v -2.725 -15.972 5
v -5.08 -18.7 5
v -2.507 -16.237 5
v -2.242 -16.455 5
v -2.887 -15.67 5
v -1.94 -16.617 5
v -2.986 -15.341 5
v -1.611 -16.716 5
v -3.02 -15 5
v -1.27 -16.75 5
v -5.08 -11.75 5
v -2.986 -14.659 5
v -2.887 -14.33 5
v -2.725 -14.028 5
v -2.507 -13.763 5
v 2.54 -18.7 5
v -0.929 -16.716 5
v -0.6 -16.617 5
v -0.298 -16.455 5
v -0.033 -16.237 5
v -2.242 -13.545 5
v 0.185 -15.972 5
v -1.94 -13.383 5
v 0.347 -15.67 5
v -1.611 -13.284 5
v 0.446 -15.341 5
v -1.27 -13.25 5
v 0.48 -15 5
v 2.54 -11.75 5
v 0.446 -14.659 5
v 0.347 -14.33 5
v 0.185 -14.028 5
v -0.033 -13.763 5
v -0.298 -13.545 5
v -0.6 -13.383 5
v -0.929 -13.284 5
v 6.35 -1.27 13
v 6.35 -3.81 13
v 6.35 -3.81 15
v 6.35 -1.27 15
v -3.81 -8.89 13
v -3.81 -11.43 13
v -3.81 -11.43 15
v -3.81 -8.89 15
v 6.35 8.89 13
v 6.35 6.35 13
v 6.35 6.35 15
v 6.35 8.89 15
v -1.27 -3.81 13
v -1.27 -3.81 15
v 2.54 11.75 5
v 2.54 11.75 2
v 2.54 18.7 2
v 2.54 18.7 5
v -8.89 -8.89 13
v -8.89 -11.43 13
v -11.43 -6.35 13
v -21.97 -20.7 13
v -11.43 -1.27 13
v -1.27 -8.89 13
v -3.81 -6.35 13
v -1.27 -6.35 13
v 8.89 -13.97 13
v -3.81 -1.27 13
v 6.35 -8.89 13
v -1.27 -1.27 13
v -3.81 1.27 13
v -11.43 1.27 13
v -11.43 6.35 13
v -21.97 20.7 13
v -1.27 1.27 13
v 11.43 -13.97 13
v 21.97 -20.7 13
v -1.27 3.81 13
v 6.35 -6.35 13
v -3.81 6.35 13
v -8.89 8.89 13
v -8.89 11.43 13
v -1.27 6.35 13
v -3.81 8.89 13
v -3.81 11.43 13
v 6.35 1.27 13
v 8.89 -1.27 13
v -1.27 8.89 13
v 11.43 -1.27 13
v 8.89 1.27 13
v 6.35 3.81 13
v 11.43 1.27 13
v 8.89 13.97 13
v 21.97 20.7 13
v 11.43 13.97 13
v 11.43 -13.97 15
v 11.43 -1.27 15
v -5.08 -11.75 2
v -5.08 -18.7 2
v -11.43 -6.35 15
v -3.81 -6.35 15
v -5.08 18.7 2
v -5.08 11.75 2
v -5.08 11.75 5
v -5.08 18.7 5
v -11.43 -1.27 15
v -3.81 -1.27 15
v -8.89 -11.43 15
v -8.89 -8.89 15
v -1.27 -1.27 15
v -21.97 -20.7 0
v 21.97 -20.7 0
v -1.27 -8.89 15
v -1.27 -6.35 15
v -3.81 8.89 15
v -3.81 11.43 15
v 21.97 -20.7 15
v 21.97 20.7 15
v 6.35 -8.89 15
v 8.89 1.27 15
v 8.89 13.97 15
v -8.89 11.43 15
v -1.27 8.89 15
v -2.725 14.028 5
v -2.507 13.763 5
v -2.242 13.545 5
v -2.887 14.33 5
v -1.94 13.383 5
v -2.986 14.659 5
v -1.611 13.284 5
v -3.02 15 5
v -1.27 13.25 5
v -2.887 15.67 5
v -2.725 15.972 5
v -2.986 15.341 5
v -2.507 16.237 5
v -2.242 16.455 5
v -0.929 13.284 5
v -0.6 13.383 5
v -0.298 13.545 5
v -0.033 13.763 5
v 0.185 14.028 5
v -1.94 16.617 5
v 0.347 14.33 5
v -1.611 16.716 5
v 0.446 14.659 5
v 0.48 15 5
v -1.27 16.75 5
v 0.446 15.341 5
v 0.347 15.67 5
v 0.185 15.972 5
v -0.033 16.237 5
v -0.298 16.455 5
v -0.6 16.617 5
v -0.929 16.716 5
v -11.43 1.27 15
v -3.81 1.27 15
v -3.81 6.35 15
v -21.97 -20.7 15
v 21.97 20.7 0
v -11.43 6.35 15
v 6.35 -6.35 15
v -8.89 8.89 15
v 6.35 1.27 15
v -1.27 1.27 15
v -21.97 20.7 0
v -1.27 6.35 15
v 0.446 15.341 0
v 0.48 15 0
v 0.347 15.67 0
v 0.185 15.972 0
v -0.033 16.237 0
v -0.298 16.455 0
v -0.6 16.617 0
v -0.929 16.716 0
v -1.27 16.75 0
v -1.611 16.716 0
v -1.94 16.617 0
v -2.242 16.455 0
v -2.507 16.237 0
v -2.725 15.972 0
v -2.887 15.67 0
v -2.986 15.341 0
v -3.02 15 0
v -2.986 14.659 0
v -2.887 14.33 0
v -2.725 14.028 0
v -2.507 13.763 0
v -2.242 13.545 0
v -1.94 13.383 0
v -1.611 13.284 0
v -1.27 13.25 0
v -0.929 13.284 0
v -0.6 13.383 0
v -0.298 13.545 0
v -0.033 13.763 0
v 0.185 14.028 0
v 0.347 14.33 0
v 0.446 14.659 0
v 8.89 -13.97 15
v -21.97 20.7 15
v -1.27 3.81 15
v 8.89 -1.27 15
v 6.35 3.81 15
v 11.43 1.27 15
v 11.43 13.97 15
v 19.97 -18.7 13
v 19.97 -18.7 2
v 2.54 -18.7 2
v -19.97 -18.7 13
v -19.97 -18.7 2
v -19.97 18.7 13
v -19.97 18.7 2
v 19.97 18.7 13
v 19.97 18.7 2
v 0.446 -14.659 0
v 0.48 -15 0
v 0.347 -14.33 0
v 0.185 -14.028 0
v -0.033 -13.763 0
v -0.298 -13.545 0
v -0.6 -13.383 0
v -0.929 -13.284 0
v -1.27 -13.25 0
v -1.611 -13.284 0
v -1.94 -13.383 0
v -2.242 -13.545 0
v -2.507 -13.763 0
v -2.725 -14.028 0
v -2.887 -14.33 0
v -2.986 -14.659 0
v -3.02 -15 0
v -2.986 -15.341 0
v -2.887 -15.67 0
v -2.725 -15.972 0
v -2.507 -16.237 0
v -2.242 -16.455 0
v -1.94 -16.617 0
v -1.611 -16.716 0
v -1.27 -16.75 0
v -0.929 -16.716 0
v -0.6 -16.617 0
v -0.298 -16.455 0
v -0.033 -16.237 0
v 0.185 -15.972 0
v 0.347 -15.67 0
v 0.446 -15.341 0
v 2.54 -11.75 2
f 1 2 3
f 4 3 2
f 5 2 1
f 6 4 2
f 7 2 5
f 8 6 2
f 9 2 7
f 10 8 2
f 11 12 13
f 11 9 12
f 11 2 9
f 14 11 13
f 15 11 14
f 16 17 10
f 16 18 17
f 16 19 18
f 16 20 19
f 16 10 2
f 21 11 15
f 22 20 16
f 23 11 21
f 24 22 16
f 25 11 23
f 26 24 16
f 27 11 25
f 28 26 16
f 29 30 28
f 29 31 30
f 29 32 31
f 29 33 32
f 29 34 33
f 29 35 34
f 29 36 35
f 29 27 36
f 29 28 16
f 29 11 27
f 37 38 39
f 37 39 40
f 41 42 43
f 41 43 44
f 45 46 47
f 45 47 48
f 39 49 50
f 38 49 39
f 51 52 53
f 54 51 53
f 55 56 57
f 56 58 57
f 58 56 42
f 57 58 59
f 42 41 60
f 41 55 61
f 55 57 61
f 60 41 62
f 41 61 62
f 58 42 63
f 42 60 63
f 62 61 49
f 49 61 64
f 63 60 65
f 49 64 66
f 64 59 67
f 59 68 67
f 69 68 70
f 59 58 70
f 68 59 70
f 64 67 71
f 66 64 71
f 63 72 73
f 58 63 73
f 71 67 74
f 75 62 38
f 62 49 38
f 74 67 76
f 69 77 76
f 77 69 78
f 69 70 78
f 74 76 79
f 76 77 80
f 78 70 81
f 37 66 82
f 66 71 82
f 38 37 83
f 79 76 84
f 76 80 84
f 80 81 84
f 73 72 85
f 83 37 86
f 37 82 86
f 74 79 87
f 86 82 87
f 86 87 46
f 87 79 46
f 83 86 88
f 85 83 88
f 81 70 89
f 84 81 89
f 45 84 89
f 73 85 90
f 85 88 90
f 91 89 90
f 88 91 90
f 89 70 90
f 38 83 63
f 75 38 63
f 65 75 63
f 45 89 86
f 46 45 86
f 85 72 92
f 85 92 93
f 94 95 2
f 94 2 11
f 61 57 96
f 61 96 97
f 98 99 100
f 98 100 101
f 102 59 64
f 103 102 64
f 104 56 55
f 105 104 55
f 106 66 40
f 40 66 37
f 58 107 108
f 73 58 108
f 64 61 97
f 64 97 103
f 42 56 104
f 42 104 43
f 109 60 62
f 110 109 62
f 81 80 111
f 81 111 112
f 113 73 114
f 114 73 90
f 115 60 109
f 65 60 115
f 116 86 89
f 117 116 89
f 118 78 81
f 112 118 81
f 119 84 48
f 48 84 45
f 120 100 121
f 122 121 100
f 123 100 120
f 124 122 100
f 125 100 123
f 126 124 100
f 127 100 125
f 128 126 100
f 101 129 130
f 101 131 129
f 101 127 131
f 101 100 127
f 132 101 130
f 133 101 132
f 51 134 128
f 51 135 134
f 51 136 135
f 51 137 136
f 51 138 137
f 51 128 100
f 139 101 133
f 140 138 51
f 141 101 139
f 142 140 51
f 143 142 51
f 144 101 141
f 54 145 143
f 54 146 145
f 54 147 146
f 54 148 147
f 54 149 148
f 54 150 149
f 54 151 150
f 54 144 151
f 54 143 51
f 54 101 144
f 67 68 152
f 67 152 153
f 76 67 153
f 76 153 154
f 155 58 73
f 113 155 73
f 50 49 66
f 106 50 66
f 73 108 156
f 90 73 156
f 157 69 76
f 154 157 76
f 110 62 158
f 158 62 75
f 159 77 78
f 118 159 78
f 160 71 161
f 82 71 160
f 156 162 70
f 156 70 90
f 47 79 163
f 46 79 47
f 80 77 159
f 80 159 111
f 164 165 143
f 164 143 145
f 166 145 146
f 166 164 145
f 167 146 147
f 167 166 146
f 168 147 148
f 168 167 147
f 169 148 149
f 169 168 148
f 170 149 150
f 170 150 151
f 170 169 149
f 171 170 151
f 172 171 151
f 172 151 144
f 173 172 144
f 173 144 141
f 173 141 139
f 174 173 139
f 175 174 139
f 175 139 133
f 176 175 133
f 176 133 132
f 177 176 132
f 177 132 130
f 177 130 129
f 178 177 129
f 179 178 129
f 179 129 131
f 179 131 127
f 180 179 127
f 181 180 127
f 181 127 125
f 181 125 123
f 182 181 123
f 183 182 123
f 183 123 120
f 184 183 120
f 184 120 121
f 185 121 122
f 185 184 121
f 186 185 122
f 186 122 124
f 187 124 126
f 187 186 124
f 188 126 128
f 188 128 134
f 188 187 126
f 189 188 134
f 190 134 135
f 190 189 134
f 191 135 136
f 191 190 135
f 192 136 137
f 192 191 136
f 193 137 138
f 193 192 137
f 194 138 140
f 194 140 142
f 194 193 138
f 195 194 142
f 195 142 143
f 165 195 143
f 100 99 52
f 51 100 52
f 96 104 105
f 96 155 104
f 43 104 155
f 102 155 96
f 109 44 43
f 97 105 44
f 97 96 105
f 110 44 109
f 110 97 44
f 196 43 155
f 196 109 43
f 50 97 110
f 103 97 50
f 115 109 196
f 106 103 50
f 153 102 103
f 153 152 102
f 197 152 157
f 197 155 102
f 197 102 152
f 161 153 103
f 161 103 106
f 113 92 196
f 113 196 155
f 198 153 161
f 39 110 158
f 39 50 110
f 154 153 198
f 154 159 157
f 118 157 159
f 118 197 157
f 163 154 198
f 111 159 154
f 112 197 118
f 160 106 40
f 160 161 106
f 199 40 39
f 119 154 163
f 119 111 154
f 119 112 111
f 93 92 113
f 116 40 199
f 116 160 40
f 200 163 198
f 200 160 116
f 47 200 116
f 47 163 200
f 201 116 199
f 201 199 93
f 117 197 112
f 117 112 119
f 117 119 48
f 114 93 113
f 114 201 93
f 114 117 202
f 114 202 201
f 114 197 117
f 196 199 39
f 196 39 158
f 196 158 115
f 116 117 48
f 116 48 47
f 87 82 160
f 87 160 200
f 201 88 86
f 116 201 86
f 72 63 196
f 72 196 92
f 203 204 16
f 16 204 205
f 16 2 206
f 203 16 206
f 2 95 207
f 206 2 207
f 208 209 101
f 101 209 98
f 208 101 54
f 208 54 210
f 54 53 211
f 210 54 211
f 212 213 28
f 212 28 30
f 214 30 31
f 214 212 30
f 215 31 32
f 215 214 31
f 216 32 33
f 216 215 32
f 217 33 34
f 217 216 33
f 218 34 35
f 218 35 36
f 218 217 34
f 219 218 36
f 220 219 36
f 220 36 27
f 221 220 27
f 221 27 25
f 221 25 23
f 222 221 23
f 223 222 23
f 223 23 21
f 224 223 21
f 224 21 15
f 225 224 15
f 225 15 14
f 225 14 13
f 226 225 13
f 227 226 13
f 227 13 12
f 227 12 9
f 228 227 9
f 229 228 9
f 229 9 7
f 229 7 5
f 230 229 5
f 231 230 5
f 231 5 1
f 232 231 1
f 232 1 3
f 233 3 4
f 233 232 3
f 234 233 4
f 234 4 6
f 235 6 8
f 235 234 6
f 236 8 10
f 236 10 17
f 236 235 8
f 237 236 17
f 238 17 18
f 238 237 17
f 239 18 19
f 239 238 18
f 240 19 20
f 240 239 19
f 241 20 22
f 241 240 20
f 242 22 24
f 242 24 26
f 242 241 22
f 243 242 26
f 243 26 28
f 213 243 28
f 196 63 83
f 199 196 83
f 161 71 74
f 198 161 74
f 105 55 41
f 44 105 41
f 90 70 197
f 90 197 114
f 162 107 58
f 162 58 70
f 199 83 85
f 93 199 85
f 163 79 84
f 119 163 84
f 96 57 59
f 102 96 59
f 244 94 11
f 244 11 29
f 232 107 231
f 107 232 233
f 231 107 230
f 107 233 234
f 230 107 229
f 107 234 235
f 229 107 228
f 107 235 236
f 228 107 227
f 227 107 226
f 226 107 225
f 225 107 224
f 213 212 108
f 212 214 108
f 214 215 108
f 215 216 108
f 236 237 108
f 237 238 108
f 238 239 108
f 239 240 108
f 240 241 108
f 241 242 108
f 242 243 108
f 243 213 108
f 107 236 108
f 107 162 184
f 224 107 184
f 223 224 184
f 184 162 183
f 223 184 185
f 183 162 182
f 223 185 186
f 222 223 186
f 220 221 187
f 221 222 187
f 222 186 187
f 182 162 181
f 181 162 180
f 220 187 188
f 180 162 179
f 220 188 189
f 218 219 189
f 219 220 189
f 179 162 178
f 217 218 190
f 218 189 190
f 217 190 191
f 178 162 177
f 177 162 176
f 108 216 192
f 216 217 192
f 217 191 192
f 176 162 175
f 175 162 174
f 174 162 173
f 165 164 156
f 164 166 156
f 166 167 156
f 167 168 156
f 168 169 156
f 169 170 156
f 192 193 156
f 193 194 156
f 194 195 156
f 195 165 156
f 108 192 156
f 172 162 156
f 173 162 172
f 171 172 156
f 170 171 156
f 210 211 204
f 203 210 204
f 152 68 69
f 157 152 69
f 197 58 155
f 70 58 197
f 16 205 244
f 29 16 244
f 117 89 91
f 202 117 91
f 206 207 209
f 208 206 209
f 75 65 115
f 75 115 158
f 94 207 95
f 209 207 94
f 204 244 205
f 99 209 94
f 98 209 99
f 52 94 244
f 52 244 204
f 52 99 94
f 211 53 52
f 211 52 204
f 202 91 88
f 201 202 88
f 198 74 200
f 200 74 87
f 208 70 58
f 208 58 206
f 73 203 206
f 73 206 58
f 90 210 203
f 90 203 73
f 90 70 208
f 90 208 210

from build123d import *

# Parameters (mm, degrees)
F0_W     = 43.94
F0_H     = 41.4
F0_W_2   = 7.62
F0_H_2   = 6.95
F0_R     = 1.75
F1_DEPTH = 2
F2_DEPTH = 13
F3_DEPTH = 5
F4_W     = 43.94
F4_H     = 41.4
F4_W_2   = 5.08
F4_H_2   = 2.54
F4_W_3   = 7.62
F4_H_3   = 5.08
F4_W_4   = 2.54
F4_H_4   = 12.7
F5_DEPTH = 2


with BuildPart() as f1:
    # F0 (on Top) → F1 (new body)
    with BuildSketch(Plane.XY):
        Rectangle(F0_W, F0_H)
        Polygon((-19.97, -18.7), (-19.97, 18.7), (-5.08, 18.7), (2.54, 18.7), (19.97, 18.7), (19.97, -18.7), (2.54, -18.7), (-5.08, -18.7), align=None, mode=Mode.SUBTRACT)
        Polygon((-5.08, 18.7), (-19.97, 18.7), (-19.97, -18.7), (-5.08, -18.7), (-5.08, -11.75), (2.54, -11.75), (2.54, -18.7), (19.97, -18.7), (19.97, 18.7), (2.54, 18.7), (2.54, 11.75), (-5.08, 11.75), align=None)
        with Locations((-1.27, 15.225)):
            Rectangle(F0_W_2, F0_H_2)
        with Locations((-1.27, 15)):
            Circle(F0_R, mode=Mode.SUBTRACT)
        with Locations((-1.27, -15.225)):
            Rectangle(F0_W_2, F0_H_2)
        with Locations((-1.27, -15)):
            Circle(F0_R, mode=Mode.SUBTRACT)
    extrude(amount=F1_DEPTH)

    # F0 (on Top) → F2 (join)
    with BuildSketch(Plane.XY):
        Rectangle(F0_W, F0_H)
        Polygon((-19.97, -18.7), (-19.97, 18.7), (-5.08, 18.7), (2.54, 18.7), (19.97, 18.7), (19.97, -18.7), (2.54, -18.7), (-5.08, -18.7), align=None, mode=Mode.SUBTRACT)
    extrude(amount=F2_DEPTH)

    # F0 (on Top) → F3 (join)
    with BuildSketch(Plane.XY):
        with Locations((-1.27, 15.225)):
            Rectangle(F0_W_2, F0_H_2)
        with Locations((-1.27, 15)):
            Circle(F0_R, mode=Mode.SUBTRACT)
        with Locations((-1.27, -15.225)):
            Rectangle(F0_W_2, F0_H_2)
        with Locations((-1.27, -15)):
            Circle(F0_R, mode=Mode.SUBTRACT)
    extrude(amount=F3_DEPTH)


with BuildPart() as f5:
    # F4 (on face) → F5 (new body)
    with BuildSketch(Plane.XY.offset(13)):
        Rectangle(F4_W, F4_H)
        with Locations((-6.35, -10.16)):
            Rectangle(F4_W_2, F4_H_2, mode=Mode.SUBTRACT)
        with Locations((-7.62, -3.81)):
            Rectangle(F4_W_3, F4_H_3, mode=Mode.SUBTRACT)
        with Locations((2.54, -7.62)):
            Rectangle(F4_W_3, F4_H_2, mode=Mode.SUBTRACT)
        with Locations((10.16, -7.62)):
            Rectangle(F4_W_4, F4_H_4, mode=Mode.SUBTRACT)
        with Locations((2.54, -2.54)):
            Rectangle(F4_W_3, F4_H_2, mode=Mode.SUBTRACT)
        with Locations((-7.62, 3.81)):
            Rectangle(F4_W_3, F4_H_3, mode=Mode.SUBTRACT)
        with Locations((-6.35, 10.16)):
            Rectangle(F4_W_2, F4_H_2, mode=Mode.SUBTRACT)
        with Locations((2.54, 2.54)):
            Rectangle(F4_W_3, F4_H_2, mode=Mode.SUBTRACT)
        with Locations((2.54, 7.62)):
            Rectangle(F4_W_3, F4_H_2, mode=Mode.SUBTRACT)
        Polygon((8.89, 11.43), (8.89, 13.97), (11.43, 13.97), (11.43, 1.27), (8.89, 1.27), align=None, mode=Mode.SUBTRACT)
    extrude(amount=F5_DEPTH)


solid = Compound([f1.part, f5.part])
